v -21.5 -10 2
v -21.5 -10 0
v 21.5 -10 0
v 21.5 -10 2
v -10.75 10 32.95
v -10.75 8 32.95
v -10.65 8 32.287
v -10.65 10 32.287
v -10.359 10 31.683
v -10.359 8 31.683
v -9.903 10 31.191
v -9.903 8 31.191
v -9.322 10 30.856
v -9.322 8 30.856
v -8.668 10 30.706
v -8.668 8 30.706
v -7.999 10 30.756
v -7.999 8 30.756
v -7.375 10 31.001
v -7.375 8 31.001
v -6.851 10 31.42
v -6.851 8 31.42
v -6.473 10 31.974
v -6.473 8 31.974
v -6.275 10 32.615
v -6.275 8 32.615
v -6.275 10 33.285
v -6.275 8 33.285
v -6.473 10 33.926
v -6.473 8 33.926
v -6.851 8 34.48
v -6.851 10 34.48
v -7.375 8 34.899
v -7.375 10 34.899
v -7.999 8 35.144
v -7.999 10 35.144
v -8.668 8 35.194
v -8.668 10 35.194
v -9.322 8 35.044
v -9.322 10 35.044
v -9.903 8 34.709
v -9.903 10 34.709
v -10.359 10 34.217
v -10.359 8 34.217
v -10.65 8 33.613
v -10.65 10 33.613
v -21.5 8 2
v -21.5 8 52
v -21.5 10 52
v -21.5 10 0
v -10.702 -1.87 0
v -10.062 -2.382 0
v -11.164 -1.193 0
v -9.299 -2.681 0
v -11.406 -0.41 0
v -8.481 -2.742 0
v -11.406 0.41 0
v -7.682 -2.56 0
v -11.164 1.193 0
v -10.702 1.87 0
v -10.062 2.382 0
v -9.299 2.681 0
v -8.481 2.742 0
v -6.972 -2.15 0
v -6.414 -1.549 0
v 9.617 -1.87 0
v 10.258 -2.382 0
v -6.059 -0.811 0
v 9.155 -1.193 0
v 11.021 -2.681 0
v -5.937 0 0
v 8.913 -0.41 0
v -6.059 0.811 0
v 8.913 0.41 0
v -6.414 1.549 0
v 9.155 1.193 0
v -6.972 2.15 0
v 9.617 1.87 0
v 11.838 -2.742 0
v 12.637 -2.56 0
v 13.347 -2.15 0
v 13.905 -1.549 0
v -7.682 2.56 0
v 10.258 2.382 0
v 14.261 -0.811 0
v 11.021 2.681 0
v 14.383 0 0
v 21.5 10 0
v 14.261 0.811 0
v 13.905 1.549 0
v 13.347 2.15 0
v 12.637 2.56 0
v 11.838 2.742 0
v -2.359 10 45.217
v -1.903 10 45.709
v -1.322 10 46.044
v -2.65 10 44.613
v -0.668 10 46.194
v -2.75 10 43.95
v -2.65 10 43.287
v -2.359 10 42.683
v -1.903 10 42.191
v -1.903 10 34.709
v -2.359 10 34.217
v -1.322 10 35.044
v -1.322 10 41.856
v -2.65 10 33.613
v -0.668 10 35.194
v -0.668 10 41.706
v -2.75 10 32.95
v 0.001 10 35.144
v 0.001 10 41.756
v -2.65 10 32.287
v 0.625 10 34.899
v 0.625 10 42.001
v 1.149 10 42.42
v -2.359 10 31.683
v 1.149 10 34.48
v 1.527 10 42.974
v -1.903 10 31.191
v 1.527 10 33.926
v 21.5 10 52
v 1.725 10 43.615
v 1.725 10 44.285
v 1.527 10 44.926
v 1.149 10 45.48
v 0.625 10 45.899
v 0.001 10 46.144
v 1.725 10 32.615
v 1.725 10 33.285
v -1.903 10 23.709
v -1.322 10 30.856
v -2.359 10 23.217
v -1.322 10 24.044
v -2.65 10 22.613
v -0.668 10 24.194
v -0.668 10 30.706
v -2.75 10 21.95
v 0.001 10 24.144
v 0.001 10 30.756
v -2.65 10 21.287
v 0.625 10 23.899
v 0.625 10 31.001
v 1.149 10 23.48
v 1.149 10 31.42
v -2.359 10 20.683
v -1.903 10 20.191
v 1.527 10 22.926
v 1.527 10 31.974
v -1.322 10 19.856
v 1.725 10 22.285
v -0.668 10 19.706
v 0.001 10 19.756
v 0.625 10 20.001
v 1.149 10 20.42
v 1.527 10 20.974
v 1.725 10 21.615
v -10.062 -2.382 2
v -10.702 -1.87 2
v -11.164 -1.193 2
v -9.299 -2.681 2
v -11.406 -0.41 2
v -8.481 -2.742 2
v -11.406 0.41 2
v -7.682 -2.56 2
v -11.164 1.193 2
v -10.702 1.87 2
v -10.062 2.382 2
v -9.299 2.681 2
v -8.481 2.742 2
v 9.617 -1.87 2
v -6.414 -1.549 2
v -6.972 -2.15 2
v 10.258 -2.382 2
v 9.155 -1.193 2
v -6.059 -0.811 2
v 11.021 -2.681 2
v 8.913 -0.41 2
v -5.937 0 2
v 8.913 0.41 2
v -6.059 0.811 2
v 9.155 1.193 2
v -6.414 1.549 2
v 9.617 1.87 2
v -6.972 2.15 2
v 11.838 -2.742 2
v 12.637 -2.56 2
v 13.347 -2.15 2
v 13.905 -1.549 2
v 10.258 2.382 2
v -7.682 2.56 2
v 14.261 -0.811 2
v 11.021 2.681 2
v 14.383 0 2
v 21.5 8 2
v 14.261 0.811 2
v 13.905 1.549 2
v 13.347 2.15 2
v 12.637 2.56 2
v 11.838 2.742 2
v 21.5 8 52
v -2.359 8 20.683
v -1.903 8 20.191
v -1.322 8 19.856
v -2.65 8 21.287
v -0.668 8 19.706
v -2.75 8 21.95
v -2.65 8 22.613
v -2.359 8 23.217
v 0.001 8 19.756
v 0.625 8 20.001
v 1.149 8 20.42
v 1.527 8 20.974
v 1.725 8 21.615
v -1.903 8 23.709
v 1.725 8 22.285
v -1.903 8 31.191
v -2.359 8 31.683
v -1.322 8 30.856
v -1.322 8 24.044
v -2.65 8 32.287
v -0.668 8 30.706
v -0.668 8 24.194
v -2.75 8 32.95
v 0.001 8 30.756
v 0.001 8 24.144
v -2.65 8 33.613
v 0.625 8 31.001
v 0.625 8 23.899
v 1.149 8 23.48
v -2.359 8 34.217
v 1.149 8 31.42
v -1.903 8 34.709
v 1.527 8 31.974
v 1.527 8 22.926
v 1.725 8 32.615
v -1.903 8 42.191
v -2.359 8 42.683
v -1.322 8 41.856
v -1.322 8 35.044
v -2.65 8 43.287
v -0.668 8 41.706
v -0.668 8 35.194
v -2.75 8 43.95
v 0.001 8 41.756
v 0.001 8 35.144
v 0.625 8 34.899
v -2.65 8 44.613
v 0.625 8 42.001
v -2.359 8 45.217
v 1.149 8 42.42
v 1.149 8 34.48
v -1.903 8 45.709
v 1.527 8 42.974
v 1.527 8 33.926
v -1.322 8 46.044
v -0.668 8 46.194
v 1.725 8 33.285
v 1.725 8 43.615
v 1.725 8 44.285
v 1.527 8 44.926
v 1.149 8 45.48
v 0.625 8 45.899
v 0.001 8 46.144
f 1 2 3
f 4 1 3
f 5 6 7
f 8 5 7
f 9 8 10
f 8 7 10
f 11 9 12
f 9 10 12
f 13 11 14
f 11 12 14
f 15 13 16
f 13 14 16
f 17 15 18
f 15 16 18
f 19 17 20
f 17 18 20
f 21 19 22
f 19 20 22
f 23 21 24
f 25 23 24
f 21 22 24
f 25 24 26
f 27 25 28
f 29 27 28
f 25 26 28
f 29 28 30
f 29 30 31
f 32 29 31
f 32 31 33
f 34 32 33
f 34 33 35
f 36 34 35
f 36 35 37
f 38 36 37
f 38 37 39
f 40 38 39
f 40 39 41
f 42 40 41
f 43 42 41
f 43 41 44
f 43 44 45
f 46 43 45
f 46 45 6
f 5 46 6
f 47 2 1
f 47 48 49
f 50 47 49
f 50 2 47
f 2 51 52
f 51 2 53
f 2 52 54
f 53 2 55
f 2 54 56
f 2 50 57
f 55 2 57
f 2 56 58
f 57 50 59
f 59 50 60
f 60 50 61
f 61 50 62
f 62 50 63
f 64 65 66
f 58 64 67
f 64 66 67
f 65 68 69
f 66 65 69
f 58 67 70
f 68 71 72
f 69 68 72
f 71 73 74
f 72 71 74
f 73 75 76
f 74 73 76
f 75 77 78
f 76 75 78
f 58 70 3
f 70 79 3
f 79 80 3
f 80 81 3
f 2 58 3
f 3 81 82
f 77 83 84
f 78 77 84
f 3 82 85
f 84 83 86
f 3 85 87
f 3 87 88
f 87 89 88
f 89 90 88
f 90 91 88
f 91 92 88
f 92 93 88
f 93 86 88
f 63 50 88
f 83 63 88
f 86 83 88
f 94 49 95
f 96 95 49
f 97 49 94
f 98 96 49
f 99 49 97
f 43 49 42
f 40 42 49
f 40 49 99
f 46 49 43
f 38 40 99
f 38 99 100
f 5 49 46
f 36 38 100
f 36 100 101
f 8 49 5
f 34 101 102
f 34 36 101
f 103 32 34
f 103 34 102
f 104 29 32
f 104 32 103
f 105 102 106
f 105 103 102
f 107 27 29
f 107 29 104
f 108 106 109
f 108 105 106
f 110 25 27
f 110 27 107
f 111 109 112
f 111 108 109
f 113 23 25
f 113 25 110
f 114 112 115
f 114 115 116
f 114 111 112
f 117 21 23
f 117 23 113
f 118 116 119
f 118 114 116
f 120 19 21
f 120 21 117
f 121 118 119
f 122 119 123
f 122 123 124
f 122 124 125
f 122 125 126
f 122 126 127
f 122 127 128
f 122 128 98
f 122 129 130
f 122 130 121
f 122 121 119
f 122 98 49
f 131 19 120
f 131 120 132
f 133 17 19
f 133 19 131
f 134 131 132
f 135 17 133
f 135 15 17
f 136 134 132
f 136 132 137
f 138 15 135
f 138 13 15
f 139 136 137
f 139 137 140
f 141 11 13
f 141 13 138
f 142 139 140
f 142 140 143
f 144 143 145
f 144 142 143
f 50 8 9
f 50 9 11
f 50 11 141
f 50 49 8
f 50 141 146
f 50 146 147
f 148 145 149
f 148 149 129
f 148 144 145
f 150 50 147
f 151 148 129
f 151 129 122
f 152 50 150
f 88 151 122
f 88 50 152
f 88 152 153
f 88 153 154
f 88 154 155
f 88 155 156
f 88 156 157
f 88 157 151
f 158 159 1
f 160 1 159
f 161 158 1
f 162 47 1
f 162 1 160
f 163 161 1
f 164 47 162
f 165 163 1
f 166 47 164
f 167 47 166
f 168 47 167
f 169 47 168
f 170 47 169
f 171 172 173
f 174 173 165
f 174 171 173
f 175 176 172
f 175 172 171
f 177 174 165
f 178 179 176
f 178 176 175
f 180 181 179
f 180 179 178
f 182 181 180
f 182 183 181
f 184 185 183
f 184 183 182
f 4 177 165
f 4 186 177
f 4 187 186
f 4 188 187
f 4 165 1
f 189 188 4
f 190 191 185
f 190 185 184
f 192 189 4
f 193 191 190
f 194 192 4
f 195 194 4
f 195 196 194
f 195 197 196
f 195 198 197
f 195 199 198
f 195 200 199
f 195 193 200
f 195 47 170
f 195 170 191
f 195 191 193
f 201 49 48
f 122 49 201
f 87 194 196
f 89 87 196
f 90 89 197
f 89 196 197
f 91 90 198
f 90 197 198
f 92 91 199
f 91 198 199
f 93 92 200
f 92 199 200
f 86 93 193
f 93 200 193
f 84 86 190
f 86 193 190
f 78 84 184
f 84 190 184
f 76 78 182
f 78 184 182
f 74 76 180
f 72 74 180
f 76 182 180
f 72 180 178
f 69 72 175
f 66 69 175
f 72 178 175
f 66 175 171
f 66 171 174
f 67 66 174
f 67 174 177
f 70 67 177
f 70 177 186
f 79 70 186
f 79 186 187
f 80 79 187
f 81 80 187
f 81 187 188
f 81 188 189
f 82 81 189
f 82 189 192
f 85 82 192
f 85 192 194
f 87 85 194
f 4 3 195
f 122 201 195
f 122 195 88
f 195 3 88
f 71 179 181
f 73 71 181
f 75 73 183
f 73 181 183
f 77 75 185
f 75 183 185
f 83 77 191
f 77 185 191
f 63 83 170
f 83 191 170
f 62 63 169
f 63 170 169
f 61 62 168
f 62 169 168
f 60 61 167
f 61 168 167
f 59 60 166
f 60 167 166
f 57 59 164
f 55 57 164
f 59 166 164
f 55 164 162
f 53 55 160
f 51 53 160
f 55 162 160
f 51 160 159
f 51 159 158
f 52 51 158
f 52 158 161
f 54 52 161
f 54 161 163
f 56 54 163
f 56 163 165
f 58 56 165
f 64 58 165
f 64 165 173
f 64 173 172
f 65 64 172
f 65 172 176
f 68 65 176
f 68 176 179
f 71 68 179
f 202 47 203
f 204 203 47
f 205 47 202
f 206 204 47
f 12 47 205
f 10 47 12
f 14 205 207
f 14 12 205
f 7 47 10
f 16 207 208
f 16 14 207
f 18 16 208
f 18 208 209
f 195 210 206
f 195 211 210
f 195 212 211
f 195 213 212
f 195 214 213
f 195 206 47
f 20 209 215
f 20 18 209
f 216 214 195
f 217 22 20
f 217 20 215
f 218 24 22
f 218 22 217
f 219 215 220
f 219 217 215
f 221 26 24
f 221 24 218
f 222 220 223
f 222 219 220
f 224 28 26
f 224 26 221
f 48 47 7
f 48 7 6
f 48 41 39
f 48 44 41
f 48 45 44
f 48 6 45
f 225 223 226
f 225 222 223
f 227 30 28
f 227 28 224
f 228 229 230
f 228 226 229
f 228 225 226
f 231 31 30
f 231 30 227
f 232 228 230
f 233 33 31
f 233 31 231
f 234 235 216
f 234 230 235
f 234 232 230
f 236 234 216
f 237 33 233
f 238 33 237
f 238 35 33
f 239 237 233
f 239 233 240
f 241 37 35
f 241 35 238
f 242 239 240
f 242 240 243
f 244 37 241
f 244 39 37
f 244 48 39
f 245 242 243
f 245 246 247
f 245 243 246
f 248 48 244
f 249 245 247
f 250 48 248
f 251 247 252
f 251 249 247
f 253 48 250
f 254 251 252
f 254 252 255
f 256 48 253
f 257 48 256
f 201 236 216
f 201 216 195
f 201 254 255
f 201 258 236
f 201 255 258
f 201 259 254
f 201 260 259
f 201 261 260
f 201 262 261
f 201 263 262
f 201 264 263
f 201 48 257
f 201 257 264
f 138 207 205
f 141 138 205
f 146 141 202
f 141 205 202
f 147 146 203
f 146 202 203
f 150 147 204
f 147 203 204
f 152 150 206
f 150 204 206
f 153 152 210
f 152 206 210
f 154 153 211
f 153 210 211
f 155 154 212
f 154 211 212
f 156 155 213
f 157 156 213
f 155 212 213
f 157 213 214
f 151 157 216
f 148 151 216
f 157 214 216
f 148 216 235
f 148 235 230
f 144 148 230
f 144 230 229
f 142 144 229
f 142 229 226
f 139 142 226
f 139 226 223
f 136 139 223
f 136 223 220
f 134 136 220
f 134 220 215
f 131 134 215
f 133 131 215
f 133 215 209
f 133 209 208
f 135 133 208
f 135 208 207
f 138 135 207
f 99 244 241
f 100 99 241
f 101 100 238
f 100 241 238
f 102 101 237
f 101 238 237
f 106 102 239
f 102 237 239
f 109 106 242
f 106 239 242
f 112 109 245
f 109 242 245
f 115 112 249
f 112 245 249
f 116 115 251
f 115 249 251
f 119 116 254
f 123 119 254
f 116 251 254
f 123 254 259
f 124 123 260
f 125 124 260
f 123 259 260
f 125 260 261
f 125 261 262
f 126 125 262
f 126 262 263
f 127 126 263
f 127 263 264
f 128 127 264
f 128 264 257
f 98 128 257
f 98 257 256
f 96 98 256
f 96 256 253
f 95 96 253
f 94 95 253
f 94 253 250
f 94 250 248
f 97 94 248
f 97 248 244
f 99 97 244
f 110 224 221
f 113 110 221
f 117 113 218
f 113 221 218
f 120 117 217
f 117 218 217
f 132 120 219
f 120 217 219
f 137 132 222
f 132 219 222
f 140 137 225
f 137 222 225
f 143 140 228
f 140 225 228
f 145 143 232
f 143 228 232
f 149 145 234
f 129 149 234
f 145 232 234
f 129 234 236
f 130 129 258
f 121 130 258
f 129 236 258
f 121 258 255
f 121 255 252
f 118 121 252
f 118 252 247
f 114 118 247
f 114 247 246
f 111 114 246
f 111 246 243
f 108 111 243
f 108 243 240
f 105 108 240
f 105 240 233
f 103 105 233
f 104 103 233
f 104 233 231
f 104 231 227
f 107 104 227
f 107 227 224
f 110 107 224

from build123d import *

# Parameters (mm, degrees)
ESQUISSE1_W             = 43
ESQUISSE1_H             = 20
BOSS_EXTRU_1_DEPTH      = 52
ESQUISSE2_W             = 57.277645312
ESQUISSE2_H             = 21.944309951
ENL_V_MAT_EXTRU_1_DEPTH = 50
D_GAGEMENT_M41_D        = 4.5
D_GAGEMENT_M51_D        = 5.5


with BuildPart() as part:
    # Esquisse1 → Boss.-Extru.1 (new body)
    with BuildSketch(Plane.XY):
        Rectangle(ESQUISSE1_W, ESQUISSE1_H)
    extrude(amount=BOSS_EXTRU_1_DEPTH)

    # Esquisse2 → Enlèv. mat.-Extru.1 (cut)
    with BuildSketch(Plane.XY.offset(52)):
        with Locations((1.570038745, -2.972154976)):
            Rectangle(ESQUISSE2_W, ESQUISSE2_H)
    extrude(amount=-ENL_V_MAT_EXTRU_1_DEPTH, mode=Mode.SUBTRACT)

    # Dégagement M41 (through all)
    with Locations(Plane(origin=(0, 10, 0), x_dir=(1, 0, 0), z_dir=(0, 1, 0))):
        with Locations((-0.5, -21.95), (-0.5, -32.95), (-0.5, -43.95), (-8.5, -32.95)):
            Hole(D_GAGEMENT_M41_D / 2)

    # Dégagement M51 (through all)
    with Locations(Plane(origin=(0, 0, 0), x_dir=(-1, 0, 0), z_dir=(0, 0, -1))):
        with Locations((-11.632687115, 0), (8.686603755, 0)):
            Hole(D_GAGEMENT_M51_D / 2)


solid = part.part
